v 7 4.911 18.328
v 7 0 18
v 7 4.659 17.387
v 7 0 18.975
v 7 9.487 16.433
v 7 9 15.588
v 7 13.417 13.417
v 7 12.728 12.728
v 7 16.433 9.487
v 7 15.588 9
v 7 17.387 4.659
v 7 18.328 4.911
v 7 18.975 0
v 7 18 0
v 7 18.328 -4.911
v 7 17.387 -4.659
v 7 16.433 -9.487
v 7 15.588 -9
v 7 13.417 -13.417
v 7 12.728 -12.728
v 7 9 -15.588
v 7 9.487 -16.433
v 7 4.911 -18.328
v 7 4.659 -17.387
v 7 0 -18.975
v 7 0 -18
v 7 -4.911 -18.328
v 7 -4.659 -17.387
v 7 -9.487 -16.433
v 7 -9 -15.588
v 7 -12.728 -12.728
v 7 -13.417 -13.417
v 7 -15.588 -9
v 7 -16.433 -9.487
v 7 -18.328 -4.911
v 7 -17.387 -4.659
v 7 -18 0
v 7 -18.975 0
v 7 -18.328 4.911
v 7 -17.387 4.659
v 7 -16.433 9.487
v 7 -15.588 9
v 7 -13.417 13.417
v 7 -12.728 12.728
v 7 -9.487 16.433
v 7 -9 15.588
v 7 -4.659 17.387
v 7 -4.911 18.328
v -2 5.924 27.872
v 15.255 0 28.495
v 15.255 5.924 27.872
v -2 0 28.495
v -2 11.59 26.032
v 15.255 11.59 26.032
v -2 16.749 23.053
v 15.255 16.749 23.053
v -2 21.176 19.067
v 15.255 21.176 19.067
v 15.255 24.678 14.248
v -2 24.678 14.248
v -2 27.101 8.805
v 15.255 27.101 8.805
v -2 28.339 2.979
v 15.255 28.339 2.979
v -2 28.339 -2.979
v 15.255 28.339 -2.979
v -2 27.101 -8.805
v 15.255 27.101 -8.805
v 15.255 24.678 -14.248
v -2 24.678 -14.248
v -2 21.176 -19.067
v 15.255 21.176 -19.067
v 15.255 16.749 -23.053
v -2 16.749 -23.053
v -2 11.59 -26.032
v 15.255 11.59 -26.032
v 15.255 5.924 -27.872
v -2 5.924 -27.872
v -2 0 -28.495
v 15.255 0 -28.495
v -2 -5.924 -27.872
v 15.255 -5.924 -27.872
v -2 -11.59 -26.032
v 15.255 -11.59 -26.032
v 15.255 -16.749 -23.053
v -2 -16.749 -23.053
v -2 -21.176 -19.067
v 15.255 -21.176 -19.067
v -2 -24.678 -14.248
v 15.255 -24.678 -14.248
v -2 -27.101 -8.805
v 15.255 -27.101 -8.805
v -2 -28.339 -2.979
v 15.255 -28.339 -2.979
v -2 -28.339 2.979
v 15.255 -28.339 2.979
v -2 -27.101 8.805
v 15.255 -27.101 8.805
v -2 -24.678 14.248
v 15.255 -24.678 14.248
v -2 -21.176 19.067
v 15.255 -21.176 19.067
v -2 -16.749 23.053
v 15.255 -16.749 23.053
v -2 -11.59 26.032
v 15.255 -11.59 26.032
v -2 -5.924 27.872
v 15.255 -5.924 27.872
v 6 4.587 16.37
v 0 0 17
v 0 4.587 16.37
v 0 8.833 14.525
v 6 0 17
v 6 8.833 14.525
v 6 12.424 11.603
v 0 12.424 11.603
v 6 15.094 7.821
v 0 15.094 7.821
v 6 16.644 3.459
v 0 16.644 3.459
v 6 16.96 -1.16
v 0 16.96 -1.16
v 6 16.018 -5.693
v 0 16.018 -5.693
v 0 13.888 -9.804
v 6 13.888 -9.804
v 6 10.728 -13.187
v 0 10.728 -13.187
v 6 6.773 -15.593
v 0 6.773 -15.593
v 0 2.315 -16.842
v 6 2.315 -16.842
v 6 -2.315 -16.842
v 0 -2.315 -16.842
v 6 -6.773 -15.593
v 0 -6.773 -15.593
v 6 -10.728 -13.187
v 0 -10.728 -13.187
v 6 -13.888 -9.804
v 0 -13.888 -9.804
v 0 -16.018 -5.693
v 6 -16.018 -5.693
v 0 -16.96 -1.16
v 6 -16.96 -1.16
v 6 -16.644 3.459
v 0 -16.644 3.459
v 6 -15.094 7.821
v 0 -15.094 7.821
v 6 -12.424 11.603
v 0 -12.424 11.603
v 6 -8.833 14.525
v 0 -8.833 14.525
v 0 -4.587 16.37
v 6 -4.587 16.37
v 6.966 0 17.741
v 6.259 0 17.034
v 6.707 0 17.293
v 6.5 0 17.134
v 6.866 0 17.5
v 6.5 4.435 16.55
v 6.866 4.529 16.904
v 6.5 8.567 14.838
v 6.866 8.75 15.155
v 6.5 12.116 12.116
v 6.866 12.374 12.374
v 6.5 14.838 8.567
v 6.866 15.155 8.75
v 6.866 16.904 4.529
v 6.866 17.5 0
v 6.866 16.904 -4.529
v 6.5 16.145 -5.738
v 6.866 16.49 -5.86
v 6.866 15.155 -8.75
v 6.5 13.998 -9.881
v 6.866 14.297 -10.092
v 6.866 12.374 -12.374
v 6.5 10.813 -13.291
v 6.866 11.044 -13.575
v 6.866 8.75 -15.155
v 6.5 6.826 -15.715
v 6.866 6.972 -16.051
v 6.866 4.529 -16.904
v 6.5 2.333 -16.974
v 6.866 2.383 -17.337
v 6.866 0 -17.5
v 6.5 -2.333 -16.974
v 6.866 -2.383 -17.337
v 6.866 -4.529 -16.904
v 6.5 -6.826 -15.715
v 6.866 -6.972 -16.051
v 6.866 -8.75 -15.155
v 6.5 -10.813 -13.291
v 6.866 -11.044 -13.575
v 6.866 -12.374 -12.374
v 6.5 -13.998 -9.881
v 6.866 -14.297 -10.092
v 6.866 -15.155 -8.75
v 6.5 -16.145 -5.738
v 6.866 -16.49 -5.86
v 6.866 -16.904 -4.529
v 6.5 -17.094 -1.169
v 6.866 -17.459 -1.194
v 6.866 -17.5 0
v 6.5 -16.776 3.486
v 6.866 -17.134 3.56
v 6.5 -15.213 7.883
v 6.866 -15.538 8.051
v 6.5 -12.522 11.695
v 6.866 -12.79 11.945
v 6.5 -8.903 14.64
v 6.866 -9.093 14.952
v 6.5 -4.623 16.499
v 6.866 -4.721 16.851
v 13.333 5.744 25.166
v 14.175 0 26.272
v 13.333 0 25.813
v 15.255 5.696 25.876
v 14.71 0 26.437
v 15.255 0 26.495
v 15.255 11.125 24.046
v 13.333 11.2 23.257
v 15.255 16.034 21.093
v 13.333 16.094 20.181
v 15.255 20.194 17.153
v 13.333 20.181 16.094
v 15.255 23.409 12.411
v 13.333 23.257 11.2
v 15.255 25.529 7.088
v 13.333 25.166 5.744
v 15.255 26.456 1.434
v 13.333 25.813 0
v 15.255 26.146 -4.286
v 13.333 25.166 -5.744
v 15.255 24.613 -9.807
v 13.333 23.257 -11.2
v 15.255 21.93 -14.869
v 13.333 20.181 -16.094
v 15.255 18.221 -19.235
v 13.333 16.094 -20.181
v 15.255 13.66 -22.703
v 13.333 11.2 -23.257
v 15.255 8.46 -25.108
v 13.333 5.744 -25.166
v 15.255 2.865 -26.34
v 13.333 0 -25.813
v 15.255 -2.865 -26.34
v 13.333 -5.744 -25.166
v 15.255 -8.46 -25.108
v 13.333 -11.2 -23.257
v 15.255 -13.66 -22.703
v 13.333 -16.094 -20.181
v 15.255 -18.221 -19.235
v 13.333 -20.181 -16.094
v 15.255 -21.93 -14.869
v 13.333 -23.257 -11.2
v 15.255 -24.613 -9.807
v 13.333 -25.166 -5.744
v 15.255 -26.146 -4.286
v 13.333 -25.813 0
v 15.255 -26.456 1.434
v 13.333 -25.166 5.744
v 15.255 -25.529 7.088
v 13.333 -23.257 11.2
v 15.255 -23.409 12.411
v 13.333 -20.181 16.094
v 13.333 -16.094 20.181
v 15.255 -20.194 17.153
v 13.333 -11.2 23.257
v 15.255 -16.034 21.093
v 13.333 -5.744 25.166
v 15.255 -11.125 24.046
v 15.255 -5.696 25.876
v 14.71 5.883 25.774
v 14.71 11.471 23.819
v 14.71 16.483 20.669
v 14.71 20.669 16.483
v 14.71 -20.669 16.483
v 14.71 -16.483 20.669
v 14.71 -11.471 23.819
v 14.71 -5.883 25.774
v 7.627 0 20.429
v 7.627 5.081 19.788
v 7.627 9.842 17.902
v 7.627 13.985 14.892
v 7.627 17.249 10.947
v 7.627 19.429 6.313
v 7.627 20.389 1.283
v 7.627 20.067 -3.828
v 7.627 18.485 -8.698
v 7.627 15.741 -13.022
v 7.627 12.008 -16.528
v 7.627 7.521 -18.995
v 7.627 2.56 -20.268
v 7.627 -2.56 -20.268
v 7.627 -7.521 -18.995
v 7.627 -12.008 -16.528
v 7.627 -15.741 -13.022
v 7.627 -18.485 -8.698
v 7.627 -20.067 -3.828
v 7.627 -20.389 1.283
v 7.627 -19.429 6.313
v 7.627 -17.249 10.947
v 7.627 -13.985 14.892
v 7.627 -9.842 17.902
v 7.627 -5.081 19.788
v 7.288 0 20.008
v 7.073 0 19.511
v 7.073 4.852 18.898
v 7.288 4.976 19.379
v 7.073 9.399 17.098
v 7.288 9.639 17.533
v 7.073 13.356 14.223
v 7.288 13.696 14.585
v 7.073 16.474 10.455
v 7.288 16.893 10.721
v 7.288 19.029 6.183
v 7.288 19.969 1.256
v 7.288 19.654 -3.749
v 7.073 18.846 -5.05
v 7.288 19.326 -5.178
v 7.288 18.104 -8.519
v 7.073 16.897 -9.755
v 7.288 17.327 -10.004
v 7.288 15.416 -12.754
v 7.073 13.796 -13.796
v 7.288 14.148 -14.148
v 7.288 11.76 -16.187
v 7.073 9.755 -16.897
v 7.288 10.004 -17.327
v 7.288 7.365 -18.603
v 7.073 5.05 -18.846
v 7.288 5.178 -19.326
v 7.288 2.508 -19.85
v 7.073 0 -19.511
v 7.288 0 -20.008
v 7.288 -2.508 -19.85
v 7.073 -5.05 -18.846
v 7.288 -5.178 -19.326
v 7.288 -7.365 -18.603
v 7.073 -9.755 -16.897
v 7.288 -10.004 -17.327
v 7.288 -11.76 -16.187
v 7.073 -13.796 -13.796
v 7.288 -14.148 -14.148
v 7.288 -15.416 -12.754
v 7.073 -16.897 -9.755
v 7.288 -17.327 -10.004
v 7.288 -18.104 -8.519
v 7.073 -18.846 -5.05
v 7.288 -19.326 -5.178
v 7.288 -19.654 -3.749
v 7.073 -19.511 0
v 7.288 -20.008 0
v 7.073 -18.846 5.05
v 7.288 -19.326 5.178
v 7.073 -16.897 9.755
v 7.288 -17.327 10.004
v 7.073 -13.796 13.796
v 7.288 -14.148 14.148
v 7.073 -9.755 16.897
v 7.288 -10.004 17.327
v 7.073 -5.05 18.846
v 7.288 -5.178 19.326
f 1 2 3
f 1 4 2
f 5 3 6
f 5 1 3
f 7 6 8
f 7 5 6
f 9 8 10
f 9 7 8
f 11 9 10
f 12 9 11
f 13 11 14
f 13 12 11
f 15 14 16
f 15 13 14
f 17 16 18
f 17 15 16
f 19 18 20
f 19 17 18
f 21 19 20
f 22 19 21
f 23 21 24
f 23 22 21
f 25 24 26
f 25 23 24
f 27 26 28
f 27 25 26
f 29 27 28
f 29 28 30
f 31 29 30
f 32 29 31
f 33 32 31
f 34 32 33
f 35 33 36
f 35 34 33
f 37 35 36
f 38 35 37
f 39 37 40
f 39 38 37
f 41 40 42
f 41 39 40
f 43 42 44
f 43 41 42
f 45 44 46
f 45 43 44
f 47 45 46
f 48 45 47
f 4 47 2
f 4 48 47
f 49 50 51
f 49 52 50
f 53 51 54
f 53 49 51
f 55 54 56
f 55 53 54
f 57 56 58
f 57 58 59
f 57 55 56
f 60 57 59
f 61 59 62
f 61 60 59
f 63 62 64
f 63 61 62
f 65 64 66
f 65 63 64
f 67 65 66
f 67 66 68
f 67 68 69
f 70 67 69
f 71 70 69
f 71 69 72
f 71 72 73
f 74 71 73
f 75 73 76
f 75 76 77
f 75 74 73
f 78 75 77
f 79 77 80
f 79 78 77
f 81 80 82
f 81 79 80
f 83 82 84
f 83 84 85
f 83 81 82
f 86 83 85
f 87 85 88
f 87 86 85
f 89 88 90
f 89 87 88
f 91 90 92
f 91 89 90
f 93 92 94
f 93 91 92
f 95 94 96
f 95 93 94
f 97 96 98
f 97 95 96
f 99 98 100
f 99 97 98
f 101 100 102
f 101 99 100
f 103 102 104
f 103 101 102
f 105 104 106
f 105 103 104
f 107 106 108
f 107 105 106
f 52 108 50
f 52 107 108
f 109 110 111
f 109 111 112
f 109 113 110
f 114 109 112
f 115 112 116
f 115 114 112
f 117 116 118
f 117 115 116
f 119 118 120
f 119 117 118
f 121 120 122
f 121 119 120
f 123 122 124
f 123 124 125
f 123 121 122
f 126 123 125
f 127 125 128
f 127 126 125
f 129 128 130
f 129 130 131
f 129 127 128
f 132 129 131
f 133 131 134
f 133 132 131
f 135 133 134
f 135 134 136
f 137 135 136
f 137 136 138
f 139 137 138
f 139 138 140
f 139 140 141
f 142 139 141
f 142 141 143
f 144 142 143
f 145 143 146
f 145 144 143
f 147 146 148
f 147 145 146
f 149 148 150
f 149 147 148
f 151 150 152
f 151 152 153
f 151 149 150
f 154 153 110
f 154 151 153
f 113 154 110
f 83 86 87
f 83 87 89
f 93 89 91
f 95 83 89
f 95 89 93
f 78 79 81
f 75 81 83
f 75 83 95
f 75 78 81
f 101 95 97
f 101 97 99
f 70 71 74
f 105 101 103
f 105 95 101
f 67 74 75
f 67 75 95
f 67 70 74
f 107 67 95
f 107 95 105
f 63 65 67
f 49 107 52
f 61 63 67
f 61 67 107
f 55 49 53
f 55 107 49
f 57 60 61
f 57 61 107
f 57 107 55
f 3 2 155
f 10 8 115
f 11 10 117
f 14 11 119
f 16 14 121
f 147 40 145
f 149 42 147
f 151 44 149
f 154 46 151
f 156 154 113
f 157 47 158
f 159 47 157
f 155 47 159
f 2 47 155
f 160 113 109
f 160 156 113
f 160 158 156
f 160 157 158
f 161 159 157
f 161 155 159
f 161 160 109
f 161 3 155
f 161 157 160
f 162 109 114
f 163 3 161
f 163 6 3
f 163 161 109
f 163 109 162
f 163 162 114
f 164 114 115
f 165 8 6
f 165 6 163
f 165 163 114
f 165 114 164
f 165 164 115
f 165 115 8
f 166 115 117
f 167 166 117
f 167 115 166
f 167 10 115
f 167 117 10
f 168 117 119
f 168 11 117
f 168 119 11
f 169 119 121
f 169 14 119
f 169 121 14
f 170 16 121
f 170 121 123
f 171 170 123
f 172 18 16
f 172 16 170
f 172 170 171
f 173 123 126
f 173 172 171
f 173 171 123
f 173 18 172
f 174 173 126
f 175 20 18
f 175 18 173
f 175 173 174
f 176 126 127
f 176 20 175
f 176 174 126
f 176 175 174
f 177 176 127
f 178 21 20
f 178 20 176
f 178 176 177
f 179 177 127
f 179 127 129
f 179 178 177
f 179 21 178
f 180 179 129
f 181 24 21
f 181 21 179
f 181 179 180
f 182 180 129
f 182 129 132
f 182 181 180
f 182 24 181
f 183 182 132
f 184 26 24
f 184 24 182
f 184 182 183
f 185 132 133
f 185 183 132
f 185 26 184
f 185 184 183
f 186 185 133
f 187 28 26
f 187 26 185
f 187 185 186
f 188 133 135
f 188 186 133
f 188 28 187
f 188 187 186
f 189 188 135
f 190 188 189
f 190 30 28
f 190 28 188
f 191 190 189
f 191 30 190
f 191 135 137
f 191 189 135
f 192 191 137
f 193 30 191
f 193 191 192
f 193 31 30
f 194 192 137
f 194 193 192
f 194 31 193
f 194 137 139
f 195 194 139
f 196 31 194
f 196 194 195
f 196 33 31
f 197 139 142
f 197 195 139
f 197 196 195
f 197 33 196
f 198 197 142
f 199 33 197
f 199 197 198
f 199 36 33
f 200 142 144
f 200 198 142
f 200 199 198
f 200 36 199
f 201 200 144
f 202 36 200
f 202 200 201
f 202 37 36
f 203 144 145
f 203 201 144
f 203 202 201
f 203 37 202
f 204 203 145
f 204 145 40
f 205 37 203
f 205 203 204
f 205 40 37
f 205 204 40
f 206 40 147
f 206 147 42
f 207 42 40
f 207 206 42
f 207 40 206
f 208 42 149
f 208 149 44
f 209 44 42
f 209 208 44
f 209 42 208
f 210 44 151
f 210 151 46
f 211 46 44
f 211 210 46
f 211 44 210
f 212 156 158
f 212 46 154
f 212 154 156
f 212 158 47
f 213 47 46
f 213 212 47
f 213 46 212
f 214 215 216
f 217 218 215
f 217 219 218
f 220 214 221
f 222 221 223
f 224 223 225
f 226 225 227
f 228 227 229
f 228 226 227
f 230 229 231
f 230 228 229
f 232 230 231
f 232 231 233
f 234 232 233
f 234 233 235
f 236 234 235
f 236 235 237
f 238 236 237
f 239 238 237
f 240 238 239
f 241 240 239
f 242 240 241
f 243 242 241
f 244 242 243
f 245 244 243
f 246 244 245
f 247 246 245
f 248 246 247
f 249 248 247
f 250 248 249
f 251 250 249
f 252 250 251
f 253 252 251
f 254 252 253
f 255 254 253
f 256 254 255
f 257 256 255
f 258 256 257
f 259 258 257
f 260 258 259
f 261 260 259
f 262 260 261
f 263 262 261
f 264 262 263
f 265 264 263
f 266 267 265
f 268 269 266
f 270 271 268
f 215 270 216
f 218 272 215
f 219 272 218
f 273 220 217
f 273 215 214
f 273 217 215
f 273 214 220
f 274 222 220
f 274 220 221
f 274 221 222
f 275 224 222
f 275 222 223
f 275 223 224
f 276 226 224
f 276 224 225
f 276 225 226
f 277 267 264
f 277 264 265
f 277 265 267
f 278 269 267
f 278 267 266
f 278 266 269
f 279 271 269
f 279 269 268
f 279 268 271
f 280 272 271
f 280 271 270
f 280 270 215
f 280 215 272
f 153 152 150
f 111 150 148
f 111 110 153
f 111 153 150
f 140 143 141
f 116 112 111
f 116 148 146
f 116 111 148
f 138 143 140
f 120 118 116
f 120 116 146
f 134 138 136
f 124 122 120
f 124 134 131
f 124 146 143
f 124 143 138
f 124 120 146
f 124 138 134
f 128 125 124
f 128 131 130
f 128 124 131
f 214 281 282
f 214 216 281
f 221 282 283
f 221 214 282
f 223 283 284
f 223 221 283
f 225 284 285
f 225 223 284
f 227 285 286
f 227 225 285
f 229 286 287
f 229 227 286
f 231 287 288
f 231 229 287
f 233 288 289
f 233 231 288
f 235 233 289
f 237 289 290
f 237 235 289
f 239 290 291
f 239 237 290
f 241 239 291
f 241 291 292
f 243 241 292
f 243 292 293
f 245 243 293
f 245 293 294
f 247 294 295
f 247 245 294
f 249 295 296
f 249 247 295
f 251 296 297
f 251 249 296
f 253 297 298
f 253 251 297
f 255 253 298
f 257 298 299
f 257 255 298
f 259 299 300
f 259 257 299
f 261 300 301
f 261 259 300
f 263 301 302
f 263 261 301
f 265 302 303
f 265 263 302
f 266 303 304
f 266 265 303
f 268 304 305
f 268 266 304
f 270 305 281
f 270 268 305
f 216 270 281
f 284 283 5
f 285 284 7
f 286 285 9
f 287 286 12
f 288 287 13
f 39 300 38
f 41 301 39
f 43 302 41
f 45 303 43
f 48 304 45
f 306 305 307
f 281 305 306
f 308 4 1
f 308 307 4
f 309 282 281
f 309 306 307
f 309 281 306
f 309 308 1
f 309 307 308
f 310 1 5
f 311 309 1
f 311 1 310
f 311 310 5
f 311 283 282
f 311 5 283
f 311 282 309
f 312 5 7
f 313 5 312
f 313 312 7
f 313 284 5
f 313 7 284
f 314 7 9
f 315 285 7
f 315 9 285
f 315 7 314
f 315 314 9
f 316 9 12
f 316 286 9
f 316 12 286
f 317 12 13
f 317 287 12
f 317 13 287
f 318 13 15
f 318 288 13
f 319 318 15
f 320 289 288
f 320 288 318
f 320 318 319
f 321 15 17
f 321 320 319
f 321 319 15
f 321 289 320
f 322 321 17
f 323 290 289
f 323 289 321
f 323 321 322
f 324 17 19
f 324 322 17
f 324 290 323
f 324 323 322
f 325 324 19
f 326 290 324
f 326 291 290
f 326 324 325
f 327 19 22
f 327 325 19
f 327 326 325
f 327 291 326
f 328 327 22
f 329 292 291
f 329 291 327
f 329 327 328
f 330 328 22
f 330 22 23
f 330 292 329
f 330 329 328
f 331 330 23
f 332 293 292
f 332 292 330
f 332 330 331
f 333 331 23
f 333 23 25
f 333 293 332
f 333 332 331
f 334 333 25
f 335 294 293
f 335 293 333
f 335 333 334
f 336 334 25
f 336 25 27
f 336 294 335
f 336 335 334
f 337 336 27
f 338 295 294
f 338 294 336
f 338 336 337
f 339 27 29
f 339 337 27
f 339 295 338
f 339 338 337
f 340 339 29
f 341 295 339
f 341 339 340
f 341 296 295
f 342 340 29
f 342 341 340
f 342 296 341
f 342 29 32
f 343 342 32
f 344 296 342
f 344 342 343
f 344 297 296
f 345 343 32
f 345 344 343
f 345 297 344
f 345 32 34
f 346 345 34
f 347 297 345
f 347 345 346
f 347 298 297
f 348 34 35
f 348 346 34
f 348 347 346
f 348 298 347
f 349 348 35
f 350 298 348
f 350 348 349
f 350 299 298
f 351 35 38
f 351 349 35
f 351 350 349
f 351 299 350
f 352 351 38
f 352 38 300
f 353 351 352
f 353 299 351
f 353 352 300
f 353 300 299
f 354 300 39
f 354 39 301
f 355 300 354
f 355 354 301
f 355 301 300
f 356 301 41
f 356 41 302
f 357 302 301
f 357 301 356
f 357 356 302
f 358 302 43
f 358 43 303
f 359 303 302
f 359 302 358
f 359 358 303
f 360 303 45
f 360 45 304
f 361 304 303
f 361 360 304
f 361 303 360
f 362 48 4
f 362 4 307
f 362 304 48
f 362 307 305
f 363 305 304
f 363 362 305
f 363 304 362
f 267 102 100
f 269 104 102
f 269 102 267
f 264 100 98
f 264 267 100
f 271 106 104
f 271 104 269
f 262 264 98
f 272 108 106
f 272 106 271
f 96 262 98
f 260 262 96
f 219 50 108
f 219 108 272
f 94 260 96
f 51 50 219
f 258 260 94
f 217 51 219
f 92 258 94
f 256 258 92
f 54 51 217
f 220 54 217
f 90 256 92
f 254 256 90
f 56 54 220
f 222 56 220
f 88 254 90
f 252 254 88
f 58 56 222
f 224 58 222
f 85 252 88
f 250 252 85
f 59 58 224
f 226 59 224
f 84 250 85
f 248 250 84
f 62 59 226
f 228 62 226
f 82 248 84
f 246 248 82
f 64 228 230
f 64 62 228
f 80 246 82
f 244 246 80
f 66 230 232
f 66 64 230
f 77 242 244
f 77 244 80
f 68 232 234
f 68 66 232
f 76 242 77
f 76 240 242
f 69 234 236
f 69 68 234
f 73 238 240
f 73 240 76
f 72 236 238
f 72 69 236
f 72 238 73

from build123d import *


with BuildPart() as f1:
    # F0 (on Front) → F1 (revolve)
    with BuildSketch(Plane.XZ):
        with BuildLine():
            Line((7.6274327665, 20.4293505417), (13.3332152067, 25.8130880211))
            add(Edge.make_bspline(
                [(13.3332152067, 25.8130880211), (13.6873531533, 26.0396653478), (14.3178862388, 26.3941712558), (14.9677615599, 26.4891502818), (15.2545960447, 26.4951649422)],
                knots=[0.0753740232, 0.0753740232, 0.0753740232, 0.0753740232, 0.236653892, 0.3609439983, 0.3609439983, 0.3609439983, 0.3609439983], degree=3))
            Line((15.2545960447, 26.4951649422), (15.2545960447, 28.4951649422))
            Line((15.2545960447, 28.4951649422), (-2, 28.4951649422))
            Line((-2, 28.4951649422), (-2, 0))
            Line((-2, 0), (0, 0))
            Line((0, 0), (0, 17))
            Line((0, 17), (5.9999981131, 17))
            ThreePointArc((5.9999981131, 17), (6.7071048494, 17.292893174), (6.9999981131, 17.9999998731))
            Line((6.9999981131, 17.9999998731), (6.9999982367, 18.9746813235))
            ThreePointArc((6.9999982367, 18.9746813235), (7.1635437461, 19.7667886958), (7.6274327665, 20.4293505417))
        make_face()
    revolve(axis=Axis((-1, 0, 0), (-1, 0, 0)))


solid = f1.part
